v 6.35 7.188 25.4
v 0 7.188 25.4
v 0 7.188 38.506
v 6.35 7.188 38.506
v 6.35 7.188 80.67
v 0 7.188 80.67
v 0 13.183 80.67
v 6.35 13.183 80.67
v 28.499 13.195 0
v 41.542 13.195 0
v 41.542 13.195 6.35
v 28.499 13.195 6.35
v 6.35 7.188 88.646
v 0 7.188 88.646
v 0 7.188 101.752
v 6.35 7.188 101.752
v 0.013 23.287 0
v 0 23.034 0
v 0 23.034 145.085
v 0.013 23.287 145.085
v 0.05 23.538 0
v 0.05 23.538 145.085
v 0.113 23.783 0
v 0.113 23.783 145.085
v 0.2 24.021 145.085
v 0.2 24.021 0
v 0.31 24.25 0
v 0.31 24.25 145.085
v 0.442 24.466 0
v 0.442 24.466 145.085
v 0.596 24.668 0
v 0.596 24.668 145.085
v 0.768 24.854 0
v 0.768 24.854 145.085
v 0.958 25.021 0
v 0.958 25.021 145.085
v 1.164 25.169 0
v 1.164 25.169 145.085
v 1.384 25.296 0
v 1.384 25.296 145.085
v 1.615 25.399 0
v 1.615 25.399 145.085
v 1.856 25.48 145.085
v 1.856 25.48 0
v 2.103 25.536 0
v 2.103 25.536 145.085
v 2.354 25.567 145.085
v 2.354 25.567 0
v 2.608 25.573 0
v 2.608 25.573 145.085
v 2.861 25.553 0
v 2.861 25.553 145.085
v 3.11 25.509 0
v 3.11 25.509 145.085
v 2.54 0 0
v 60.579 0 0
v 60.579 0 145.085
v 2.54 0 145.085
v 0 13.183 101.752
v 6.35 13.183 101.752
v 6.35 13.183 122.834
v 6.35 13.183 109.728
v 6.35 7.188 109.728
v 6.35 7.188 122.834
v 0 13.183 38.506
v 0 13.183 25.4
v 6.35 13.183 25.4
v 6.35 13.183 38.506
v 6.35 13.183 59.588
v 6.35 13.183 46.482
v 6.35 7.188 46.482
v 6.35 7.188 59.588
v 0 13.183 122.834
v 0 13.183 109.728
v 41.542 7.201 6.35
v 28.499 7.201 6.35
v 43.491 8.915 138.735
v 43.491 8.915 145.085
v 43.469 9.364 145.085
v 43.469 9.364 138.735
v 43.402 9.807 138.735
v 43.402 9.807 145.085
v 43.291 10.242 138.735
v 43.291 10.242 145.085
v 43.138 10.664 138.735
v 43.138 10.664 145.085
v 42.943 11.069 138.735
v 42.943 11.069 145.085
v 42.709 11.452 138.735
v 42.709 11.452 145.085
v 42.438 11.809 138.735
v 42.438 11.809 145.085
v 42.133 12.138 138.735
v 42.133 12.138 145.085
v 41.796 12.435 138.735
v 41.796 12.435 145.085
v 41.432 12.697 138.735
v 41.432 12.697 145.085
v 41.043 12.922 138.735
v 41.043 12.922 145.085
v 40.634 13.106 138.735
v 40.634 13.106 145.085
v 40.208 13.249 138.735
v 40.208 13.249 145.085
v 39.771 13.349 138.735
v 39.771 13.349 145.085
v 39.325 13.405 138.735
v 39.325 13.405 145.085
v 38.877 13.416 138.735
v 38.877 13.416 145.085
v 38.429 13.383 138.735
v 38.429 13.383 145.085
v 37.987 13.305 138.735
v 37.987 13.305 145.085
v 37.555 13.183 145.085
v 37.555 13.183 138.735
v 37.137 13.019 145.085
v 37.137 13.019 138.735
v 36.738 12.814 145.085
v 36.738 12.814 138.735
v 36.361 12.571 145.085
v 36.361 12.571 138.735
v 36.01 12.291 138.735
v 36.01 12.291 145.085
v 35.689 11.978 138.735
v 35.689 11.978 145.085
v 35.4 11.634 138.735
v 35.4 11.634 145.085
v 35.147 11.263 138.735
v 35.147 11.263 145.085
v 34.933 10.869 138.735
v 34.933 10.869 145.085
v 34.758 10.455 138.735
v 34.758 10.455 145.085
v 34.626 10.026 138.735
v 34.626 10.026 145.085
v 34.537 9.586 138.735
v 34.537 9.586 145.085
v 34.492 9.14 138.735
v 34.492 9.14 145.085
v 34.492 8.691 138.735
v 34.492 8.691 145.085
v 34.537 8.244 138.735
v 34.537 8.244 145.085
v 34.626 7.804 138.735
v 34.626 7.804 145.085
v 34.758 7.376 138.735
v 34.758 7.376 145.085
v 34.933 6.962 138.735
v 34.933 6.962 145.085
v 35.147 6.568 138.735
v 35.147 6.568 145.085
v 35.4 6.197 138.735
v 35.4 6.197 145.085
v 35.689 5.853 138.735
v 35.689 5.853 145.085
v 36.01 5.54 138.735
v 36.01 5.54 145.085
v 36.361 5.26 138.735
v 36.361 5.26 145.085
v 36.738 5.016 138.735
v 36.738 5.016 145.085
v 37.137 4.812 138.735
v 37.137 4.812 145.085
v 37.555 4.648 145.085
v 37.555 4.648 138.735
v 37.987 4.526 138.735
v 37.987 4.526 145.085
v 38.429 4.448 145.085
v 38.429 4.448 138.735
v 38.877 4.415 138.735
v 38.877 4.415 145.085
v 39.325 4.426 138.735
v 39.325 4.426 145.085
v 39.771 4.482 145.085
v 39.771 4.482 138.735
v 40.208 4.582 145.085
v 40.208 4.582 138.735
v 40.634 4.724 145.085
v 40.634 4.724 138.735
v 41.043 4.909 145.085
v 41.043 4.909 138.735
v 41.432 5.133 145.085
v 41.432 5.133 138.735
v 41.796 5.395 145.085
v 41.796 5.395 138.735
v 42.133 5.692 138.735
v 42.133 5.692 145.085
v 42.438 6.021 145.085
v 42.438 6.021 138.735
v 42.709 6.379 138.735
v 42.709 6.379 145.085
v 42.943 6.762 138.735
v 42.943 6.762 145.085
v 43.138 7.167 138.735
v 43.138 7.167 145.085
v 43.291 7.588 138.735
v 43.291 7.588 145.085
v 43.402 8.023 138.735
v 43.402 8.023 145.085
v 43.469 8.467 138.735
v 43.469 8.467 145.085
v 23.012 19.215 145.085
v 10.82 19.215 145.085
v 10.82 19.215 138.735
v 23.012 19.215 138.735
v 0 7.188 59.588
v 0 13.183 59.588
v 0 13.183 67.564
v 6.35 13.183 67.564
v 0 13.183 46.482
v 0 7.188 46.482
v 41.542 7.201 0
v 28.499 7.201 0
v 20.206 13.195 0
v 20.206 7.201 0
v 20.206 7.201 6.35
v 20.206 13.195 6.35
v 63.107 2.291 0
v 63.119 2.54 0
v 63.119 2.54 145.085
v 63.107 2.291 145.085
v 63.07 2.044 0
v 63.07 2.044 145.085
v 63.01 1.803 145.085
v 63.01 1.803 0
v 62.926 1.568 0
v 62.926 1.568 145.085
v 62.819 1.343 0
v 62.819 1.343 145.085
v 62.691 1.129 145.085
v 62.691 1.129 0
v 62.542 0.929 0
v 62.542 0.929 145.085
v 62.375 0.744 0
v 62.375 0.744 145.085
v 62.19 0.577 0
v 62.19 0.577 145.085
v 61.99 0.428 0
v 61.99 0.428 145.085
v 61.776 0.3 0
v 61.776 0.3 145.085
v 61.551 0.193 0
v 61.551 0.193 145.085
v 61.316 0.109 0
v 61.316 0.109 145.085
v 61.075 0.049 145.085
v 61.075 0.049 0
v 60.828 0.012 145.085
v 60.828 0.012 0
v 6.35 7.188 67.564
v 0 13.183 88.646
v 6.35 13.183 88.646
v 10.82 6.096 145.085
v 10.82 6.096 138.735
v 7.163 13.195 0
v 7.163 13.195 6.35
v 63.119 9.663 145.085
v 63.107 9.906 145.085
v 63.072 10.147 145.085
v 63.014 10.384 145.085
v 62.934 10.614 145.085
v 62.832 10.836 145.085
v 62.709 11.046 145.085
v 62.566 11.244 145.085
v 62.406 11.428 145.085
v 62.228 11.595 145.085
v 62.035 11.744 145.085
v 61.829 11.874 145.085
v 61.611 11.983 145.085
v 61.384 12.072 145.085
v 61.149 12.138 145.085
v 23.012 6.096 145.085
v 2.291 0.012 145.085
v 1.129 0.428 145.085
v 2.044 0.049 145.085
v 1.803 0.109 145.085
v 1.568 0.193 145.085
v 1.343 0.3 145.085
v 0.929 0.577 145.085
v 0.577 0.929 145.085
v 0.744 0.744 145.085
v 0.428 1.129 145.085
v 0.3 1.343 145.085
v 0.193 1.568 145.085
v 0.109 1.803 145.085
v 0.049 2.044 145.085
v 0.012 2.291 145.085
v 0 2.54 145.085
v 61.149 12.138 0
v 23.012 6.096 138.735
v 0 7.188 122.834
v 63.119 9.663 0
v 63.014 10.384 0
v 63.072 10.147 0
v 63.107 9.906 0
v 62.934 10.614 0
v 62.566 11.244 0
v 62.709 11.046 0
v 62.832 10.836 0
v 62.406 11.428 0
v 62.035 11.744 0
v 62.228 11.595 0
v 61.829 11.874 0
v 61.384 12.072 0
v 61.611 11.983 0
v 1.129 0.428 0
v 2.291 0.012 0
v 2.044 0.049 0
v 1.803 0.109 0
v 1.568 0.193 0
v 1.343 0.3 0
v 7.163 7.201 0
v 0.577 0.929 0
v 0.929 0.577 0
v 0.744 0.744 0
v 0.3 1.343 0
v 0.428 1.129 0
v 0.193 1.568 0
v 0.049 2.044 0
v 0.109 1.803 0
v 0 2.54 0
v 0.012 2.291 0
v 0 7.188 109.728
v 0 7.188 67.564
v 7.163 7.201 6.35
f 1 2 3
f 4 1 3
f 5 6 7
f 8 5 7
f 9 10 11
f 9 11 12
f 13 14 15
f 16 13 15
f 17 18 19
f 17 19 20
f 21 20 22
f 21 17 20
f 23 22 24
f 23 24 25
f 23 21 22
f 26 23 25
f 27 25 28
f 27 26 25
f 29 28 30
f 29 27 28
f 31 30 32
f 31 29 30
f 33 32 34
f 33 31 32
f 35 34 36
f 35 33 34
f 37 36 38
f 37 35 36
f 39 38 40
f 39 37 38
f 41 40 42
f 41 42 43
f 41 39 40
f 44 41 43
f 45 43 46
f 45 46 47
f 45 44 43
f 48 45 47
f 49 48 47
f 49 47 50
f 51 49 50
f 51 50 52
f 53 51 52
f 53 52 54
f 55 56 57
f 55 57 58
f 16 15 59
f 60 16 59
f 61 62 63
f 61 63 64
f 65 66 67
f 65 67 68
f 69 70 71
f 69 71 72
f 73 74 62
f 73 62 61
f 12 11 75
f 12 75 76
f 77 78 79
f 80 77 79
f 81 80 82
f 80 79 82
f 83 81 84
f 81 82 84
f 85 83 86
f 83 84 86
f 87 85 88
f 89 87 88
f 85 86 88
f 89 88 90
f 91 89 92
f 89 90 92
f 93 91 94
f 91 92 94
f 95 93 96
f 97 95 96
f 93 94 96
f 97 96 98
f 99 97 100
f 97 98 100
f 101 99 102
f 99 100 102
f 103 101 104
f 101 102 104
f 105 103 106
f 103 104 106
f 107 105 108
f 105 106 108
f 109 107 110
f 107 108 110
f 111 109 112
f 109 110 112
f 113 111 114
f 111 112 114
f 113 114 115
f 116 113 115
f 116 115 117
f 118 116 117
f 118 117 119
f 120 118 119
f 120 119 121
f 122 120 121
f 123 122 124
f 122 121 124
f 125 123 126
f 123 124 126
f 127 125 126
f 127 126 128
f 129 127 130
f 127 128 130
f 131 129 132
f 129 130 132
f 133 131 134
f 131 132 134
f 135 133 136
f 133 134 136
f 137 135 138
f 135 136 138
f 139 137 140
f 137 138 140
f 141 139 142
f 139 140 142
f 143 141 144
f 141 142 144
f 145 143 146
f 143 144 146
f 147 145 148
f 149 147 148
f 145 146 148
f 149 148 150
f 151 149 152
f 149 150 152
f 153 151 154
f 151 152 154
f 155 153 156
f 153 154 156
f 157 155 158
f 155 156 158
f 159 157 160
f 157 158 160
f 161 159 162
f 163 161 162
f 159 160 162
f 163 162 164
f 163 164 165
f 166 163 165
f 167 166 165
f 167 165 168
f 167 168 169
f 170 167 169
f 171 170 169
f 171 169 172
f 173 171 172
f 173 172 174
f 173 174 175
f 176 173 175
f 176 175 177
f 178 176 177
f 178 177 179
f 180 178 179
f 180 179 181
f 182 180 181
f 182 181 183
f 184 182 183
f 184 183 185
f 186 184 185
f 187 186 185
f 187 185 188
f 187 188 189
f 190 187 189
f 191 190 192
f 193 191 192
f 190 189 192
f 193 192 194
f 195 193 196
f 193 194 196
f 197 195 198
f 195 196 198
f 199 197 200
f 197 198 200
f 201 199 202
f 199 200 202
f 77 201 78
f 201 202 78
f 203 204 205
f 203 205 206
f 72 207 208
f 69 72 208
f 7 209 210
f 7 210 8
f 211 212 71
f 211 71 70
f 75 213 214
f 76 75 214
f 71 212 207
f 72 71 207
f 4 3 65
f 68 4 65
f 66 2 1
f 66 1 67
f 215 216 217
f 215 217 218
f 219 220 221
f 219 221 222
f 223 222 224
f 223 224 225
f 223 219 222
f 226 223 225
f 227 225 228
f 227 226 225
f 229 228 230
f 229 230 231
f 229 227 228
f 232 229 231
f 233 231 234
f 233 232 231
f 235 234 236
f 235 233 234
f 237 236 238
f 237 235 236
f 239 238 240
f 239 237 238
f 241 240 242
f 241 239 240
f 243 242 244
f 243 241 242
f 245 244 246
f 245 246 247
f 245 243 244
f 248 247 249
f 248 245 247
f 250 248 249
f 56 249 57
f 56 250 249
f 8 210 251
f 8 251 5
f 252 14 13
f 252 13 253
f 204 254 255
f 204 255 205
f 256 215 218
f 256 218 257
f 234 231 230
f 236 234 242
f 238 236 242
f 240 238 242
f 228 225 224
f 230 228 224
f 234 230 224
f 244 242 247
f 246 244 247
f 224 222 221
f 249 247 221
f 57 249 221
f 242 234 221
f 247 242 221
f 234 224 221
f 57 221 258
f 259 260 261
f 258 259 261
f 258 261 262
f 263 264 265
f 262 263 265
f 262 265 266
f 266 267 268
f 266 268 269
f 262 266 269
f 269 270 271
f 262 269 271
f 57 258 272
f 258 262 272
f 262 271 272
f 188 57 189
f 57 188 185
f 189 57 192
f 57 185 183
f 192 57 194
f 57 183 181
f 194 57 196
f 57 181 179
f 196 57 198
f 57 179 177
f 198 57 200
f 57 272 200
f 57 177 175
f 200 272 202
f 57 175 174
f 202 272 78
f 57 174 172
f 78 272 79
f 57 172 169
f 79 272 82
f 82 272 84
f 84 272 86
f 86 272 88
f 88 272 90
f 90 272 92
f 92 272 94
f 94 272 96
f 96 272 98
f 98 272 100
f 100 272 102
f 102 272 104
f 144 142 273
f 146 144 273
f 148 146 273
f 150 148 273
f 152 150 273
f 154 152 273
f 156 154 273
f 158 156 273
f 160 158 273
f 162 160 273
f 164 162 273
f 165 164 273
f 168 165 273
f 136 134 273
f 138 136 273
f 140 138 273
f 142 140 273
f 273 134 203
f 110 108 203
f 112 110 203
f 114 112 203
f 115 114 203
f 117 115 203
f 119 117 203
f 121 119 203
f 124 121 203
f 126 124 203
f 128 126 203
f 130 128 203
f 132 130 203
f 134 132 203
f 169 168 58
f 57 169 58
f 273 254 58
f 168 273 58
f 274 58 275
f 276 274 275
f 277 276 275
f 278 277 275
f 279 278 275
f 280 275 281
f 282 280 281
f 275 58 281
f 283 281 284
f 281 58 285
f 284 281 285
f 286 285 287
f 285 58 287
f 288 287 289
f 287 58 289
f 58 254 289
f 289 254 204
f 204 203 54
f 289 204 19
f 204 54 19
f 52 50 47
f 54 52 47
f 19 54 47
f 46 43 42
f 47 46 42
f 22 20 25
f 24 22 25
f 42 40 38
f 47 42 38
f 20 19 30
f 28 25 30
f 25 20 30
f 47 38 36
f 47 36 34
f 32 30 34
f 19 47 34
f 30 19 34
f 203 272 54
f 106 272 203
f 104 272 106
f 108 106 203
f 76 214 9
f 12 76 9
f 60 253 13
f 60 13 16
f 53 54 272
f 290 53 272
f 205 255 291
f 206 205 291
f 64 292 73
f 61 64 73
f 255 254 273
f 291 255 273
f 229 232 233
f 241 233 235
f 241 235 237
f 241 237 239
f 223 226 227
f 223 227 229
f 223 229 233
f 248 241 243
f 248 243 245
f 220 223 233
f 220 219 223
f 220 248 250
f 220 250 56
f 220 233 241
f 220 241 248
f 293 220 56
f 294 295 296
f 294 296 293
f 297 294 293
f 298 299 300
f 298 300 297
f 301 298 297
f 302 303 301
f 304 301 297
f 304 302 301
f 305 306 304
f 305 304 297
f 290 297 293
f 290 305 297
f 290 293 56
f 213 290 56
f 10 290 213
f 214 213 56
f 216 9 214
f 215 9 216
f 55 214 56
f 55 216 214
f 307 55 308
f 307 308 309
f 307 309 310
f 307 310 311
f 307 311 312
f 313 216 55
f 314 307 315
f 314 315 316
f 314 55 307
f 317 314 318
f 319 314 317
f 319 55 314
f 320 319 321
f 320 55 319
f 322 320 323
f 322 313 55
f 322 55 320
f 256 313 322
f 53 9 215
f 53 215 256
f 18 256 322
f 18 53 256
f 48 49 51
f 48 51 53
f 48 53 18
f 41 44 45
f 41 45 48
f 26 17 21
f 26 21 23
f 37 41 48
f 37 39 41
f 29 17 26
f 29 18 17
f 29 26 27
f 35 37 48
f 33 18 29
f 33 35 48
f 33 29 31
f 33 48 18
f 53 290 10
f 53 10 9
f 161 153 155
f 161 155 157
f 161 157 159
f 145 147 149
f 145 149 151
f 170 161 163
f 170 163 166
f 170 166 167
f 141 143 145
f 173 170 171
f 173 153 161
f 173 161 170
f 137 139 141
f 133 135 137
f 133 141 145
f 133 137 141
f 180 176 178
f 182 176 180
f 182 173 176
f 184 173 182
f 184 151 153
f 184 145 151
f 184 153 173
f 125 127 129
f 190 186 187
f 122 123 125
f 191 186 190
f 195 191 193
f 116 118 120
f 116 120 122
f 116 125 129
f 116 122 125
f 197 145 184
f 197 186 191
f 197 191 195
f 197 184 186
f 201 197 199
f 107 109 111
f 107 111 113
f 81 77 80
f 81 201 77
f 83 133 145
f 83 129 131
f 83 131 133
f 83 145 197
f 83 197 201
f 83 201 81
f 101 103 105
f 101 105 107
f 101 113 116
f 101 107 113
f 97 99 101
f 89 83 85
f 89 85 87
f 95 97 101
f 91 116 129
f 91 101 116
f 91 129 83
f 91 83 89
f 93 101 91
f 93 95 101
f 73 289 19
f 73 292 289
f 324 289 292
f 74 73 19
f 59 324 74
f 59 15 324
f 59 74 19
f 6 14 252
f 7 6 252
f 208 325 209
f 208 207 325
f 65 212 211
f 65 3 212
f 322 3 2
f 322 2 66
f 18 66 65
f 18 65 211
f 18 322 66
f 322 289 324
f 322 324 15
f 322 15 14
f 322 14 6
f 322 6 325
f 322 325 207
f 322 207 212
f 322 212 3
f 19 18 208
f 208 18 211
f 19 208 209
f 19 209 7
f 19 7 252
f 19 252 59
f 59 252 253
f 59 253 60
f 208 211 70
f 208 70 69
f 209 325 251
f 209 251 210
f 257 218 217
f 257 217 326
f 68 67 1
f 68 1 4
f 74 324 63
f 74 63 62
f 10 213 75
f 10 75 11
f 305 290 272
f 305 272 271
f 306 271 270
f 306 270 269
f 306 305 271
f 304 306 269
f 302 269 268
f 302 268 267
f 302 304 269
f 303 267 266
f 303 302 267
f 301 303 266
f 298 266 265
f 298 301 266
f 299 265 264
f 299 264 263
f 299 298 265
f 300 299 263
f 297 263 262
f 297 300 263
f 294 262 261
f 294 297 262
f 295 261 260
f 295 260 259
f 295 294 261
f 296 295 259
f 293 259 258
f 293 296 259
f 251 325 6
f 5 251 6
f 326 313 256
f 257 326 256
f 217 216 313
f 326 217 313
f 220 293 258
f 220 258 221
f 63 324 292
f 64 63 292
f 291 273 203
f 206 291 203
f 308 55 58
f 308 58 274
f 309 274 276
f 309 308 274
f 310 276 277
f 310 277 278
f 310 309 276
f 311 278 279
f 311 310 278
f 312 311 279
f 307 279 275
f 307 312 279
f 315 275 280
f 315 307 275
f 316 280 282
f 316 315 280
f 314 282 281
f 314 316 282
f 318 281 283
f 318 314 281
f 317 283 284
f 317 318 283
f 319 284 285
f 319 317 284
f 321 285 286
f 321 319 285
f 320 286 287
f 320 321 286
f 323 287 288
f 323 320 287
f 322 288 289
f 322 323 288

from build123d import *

# Parameters (mm, degrees)
BOSS_EXTRUDE1_DEPTH = 145.0848
SKETCH2_R           = 4.50215
SKETCH2_W           = 12.192
SKETCH2_H           = 13.1191
CUT_EXTRUDE1_DEPTH  = 6.35
SKETCH3_W           = 13.1064
SKETCH3_H           = 5.9944
CUT_EXTRUDE2_DEPTH  = 6.35
SKETCH4_W           = 13.0429
SKETCH4_H           = 5.9944
CUT_EXTRUDE3_DEPTH  = 6.35


with BuildPart() as part:
    # Sketch1 → Boss-Extrude1 (new body)
    with BuildSketch(Plane.XY):
        with BuildLine():
            Line((3.110233801, 25.508957203), (61.149233801, 12.137799255))
            ThreePointArc((61.149233801, 12.137799255), (62.566459918, 11.24428163), (63.119, 9.662635945))
            Line((63.119, 9.662635945), (63.119, 2.54))
            ThreePointArc((63.119, 2.54), (62.375051224, 0.743948776), (60.579, 0))
            Line((60.579, 0), (2.54, 0))
            ThreePointArc((2.54, 0), (0.743948776, 0.743948776), (0, 2.54))
            Line((0, 2.54), (0, 23.033793893))
            ThreePointArc((0, 23.033793893), (0.958354315, 25.021253811), (3.110233801, 25.508957203))
        make_face()
    extrude(amount=BOSS_EXTRUDE1_DEPTH)

    # Sketch2 → Cut-Extrude1 (cut)
    with BuildSketch(Plane.XY.offset(145.0848)):
        with Locations((38.989, 8.9154)):
            Circle(SKETCH2_R)
        with Locations((16.9164, 12.65555)):
            Rectangle(SKETCH2_W, SKETCH2_H)
    extrude(amount=-CUT_EXTRUDE1_DEPTH, mode=Mode.SUBTRACT)

    # Sketch3 → Cut-Extrude2 (cut)
    with BuildSketch(Plane.ZY):
        with Locations((31.9532, 10.1854)):
            Rectangle(SKETCH3_W, SKETCH3_H)
        with Locations((53.0352, 10.1854)):
            Rectangle(SKETCH3_W, SKETCH3_H)
        with Locations((74.1172, 10.1854)):
            Rectangle(SKETCH3_W, SKETCH3_H)
        with Locations((95.1992, 10.1854)):
            Rectangle(SKETCH3_W, SKETCH3_H)
        with Locations((116.2812, 10.1854)):
            Rectangle(SKETCH3_W, SKETCH3_H)
    extrude(amount=-CUT_EXTRUDE2_DEPTH, mode=Mode.SUBTRACT)

    # Sketch4 → Cut-Extrude3 (cut)
    with BuildSketch(Plane(origin=(0, 0, 0), x_dir=(-1, 0, 0), z_dir=(0, 0, -1))):
        with Locations((-13.68425, 10.1981)):
            Rectangle(SKETCH4_W, SKETCH4_H)
        with Locations((-35.02025, 10.1981)):
            Rectangle(SKETCH4_W, SKETCH4_H)
    extrude(amount=-CUT_EXTRUDE3_DEPTH, mode=Mode.SUBTRACT)


solid = part.part
